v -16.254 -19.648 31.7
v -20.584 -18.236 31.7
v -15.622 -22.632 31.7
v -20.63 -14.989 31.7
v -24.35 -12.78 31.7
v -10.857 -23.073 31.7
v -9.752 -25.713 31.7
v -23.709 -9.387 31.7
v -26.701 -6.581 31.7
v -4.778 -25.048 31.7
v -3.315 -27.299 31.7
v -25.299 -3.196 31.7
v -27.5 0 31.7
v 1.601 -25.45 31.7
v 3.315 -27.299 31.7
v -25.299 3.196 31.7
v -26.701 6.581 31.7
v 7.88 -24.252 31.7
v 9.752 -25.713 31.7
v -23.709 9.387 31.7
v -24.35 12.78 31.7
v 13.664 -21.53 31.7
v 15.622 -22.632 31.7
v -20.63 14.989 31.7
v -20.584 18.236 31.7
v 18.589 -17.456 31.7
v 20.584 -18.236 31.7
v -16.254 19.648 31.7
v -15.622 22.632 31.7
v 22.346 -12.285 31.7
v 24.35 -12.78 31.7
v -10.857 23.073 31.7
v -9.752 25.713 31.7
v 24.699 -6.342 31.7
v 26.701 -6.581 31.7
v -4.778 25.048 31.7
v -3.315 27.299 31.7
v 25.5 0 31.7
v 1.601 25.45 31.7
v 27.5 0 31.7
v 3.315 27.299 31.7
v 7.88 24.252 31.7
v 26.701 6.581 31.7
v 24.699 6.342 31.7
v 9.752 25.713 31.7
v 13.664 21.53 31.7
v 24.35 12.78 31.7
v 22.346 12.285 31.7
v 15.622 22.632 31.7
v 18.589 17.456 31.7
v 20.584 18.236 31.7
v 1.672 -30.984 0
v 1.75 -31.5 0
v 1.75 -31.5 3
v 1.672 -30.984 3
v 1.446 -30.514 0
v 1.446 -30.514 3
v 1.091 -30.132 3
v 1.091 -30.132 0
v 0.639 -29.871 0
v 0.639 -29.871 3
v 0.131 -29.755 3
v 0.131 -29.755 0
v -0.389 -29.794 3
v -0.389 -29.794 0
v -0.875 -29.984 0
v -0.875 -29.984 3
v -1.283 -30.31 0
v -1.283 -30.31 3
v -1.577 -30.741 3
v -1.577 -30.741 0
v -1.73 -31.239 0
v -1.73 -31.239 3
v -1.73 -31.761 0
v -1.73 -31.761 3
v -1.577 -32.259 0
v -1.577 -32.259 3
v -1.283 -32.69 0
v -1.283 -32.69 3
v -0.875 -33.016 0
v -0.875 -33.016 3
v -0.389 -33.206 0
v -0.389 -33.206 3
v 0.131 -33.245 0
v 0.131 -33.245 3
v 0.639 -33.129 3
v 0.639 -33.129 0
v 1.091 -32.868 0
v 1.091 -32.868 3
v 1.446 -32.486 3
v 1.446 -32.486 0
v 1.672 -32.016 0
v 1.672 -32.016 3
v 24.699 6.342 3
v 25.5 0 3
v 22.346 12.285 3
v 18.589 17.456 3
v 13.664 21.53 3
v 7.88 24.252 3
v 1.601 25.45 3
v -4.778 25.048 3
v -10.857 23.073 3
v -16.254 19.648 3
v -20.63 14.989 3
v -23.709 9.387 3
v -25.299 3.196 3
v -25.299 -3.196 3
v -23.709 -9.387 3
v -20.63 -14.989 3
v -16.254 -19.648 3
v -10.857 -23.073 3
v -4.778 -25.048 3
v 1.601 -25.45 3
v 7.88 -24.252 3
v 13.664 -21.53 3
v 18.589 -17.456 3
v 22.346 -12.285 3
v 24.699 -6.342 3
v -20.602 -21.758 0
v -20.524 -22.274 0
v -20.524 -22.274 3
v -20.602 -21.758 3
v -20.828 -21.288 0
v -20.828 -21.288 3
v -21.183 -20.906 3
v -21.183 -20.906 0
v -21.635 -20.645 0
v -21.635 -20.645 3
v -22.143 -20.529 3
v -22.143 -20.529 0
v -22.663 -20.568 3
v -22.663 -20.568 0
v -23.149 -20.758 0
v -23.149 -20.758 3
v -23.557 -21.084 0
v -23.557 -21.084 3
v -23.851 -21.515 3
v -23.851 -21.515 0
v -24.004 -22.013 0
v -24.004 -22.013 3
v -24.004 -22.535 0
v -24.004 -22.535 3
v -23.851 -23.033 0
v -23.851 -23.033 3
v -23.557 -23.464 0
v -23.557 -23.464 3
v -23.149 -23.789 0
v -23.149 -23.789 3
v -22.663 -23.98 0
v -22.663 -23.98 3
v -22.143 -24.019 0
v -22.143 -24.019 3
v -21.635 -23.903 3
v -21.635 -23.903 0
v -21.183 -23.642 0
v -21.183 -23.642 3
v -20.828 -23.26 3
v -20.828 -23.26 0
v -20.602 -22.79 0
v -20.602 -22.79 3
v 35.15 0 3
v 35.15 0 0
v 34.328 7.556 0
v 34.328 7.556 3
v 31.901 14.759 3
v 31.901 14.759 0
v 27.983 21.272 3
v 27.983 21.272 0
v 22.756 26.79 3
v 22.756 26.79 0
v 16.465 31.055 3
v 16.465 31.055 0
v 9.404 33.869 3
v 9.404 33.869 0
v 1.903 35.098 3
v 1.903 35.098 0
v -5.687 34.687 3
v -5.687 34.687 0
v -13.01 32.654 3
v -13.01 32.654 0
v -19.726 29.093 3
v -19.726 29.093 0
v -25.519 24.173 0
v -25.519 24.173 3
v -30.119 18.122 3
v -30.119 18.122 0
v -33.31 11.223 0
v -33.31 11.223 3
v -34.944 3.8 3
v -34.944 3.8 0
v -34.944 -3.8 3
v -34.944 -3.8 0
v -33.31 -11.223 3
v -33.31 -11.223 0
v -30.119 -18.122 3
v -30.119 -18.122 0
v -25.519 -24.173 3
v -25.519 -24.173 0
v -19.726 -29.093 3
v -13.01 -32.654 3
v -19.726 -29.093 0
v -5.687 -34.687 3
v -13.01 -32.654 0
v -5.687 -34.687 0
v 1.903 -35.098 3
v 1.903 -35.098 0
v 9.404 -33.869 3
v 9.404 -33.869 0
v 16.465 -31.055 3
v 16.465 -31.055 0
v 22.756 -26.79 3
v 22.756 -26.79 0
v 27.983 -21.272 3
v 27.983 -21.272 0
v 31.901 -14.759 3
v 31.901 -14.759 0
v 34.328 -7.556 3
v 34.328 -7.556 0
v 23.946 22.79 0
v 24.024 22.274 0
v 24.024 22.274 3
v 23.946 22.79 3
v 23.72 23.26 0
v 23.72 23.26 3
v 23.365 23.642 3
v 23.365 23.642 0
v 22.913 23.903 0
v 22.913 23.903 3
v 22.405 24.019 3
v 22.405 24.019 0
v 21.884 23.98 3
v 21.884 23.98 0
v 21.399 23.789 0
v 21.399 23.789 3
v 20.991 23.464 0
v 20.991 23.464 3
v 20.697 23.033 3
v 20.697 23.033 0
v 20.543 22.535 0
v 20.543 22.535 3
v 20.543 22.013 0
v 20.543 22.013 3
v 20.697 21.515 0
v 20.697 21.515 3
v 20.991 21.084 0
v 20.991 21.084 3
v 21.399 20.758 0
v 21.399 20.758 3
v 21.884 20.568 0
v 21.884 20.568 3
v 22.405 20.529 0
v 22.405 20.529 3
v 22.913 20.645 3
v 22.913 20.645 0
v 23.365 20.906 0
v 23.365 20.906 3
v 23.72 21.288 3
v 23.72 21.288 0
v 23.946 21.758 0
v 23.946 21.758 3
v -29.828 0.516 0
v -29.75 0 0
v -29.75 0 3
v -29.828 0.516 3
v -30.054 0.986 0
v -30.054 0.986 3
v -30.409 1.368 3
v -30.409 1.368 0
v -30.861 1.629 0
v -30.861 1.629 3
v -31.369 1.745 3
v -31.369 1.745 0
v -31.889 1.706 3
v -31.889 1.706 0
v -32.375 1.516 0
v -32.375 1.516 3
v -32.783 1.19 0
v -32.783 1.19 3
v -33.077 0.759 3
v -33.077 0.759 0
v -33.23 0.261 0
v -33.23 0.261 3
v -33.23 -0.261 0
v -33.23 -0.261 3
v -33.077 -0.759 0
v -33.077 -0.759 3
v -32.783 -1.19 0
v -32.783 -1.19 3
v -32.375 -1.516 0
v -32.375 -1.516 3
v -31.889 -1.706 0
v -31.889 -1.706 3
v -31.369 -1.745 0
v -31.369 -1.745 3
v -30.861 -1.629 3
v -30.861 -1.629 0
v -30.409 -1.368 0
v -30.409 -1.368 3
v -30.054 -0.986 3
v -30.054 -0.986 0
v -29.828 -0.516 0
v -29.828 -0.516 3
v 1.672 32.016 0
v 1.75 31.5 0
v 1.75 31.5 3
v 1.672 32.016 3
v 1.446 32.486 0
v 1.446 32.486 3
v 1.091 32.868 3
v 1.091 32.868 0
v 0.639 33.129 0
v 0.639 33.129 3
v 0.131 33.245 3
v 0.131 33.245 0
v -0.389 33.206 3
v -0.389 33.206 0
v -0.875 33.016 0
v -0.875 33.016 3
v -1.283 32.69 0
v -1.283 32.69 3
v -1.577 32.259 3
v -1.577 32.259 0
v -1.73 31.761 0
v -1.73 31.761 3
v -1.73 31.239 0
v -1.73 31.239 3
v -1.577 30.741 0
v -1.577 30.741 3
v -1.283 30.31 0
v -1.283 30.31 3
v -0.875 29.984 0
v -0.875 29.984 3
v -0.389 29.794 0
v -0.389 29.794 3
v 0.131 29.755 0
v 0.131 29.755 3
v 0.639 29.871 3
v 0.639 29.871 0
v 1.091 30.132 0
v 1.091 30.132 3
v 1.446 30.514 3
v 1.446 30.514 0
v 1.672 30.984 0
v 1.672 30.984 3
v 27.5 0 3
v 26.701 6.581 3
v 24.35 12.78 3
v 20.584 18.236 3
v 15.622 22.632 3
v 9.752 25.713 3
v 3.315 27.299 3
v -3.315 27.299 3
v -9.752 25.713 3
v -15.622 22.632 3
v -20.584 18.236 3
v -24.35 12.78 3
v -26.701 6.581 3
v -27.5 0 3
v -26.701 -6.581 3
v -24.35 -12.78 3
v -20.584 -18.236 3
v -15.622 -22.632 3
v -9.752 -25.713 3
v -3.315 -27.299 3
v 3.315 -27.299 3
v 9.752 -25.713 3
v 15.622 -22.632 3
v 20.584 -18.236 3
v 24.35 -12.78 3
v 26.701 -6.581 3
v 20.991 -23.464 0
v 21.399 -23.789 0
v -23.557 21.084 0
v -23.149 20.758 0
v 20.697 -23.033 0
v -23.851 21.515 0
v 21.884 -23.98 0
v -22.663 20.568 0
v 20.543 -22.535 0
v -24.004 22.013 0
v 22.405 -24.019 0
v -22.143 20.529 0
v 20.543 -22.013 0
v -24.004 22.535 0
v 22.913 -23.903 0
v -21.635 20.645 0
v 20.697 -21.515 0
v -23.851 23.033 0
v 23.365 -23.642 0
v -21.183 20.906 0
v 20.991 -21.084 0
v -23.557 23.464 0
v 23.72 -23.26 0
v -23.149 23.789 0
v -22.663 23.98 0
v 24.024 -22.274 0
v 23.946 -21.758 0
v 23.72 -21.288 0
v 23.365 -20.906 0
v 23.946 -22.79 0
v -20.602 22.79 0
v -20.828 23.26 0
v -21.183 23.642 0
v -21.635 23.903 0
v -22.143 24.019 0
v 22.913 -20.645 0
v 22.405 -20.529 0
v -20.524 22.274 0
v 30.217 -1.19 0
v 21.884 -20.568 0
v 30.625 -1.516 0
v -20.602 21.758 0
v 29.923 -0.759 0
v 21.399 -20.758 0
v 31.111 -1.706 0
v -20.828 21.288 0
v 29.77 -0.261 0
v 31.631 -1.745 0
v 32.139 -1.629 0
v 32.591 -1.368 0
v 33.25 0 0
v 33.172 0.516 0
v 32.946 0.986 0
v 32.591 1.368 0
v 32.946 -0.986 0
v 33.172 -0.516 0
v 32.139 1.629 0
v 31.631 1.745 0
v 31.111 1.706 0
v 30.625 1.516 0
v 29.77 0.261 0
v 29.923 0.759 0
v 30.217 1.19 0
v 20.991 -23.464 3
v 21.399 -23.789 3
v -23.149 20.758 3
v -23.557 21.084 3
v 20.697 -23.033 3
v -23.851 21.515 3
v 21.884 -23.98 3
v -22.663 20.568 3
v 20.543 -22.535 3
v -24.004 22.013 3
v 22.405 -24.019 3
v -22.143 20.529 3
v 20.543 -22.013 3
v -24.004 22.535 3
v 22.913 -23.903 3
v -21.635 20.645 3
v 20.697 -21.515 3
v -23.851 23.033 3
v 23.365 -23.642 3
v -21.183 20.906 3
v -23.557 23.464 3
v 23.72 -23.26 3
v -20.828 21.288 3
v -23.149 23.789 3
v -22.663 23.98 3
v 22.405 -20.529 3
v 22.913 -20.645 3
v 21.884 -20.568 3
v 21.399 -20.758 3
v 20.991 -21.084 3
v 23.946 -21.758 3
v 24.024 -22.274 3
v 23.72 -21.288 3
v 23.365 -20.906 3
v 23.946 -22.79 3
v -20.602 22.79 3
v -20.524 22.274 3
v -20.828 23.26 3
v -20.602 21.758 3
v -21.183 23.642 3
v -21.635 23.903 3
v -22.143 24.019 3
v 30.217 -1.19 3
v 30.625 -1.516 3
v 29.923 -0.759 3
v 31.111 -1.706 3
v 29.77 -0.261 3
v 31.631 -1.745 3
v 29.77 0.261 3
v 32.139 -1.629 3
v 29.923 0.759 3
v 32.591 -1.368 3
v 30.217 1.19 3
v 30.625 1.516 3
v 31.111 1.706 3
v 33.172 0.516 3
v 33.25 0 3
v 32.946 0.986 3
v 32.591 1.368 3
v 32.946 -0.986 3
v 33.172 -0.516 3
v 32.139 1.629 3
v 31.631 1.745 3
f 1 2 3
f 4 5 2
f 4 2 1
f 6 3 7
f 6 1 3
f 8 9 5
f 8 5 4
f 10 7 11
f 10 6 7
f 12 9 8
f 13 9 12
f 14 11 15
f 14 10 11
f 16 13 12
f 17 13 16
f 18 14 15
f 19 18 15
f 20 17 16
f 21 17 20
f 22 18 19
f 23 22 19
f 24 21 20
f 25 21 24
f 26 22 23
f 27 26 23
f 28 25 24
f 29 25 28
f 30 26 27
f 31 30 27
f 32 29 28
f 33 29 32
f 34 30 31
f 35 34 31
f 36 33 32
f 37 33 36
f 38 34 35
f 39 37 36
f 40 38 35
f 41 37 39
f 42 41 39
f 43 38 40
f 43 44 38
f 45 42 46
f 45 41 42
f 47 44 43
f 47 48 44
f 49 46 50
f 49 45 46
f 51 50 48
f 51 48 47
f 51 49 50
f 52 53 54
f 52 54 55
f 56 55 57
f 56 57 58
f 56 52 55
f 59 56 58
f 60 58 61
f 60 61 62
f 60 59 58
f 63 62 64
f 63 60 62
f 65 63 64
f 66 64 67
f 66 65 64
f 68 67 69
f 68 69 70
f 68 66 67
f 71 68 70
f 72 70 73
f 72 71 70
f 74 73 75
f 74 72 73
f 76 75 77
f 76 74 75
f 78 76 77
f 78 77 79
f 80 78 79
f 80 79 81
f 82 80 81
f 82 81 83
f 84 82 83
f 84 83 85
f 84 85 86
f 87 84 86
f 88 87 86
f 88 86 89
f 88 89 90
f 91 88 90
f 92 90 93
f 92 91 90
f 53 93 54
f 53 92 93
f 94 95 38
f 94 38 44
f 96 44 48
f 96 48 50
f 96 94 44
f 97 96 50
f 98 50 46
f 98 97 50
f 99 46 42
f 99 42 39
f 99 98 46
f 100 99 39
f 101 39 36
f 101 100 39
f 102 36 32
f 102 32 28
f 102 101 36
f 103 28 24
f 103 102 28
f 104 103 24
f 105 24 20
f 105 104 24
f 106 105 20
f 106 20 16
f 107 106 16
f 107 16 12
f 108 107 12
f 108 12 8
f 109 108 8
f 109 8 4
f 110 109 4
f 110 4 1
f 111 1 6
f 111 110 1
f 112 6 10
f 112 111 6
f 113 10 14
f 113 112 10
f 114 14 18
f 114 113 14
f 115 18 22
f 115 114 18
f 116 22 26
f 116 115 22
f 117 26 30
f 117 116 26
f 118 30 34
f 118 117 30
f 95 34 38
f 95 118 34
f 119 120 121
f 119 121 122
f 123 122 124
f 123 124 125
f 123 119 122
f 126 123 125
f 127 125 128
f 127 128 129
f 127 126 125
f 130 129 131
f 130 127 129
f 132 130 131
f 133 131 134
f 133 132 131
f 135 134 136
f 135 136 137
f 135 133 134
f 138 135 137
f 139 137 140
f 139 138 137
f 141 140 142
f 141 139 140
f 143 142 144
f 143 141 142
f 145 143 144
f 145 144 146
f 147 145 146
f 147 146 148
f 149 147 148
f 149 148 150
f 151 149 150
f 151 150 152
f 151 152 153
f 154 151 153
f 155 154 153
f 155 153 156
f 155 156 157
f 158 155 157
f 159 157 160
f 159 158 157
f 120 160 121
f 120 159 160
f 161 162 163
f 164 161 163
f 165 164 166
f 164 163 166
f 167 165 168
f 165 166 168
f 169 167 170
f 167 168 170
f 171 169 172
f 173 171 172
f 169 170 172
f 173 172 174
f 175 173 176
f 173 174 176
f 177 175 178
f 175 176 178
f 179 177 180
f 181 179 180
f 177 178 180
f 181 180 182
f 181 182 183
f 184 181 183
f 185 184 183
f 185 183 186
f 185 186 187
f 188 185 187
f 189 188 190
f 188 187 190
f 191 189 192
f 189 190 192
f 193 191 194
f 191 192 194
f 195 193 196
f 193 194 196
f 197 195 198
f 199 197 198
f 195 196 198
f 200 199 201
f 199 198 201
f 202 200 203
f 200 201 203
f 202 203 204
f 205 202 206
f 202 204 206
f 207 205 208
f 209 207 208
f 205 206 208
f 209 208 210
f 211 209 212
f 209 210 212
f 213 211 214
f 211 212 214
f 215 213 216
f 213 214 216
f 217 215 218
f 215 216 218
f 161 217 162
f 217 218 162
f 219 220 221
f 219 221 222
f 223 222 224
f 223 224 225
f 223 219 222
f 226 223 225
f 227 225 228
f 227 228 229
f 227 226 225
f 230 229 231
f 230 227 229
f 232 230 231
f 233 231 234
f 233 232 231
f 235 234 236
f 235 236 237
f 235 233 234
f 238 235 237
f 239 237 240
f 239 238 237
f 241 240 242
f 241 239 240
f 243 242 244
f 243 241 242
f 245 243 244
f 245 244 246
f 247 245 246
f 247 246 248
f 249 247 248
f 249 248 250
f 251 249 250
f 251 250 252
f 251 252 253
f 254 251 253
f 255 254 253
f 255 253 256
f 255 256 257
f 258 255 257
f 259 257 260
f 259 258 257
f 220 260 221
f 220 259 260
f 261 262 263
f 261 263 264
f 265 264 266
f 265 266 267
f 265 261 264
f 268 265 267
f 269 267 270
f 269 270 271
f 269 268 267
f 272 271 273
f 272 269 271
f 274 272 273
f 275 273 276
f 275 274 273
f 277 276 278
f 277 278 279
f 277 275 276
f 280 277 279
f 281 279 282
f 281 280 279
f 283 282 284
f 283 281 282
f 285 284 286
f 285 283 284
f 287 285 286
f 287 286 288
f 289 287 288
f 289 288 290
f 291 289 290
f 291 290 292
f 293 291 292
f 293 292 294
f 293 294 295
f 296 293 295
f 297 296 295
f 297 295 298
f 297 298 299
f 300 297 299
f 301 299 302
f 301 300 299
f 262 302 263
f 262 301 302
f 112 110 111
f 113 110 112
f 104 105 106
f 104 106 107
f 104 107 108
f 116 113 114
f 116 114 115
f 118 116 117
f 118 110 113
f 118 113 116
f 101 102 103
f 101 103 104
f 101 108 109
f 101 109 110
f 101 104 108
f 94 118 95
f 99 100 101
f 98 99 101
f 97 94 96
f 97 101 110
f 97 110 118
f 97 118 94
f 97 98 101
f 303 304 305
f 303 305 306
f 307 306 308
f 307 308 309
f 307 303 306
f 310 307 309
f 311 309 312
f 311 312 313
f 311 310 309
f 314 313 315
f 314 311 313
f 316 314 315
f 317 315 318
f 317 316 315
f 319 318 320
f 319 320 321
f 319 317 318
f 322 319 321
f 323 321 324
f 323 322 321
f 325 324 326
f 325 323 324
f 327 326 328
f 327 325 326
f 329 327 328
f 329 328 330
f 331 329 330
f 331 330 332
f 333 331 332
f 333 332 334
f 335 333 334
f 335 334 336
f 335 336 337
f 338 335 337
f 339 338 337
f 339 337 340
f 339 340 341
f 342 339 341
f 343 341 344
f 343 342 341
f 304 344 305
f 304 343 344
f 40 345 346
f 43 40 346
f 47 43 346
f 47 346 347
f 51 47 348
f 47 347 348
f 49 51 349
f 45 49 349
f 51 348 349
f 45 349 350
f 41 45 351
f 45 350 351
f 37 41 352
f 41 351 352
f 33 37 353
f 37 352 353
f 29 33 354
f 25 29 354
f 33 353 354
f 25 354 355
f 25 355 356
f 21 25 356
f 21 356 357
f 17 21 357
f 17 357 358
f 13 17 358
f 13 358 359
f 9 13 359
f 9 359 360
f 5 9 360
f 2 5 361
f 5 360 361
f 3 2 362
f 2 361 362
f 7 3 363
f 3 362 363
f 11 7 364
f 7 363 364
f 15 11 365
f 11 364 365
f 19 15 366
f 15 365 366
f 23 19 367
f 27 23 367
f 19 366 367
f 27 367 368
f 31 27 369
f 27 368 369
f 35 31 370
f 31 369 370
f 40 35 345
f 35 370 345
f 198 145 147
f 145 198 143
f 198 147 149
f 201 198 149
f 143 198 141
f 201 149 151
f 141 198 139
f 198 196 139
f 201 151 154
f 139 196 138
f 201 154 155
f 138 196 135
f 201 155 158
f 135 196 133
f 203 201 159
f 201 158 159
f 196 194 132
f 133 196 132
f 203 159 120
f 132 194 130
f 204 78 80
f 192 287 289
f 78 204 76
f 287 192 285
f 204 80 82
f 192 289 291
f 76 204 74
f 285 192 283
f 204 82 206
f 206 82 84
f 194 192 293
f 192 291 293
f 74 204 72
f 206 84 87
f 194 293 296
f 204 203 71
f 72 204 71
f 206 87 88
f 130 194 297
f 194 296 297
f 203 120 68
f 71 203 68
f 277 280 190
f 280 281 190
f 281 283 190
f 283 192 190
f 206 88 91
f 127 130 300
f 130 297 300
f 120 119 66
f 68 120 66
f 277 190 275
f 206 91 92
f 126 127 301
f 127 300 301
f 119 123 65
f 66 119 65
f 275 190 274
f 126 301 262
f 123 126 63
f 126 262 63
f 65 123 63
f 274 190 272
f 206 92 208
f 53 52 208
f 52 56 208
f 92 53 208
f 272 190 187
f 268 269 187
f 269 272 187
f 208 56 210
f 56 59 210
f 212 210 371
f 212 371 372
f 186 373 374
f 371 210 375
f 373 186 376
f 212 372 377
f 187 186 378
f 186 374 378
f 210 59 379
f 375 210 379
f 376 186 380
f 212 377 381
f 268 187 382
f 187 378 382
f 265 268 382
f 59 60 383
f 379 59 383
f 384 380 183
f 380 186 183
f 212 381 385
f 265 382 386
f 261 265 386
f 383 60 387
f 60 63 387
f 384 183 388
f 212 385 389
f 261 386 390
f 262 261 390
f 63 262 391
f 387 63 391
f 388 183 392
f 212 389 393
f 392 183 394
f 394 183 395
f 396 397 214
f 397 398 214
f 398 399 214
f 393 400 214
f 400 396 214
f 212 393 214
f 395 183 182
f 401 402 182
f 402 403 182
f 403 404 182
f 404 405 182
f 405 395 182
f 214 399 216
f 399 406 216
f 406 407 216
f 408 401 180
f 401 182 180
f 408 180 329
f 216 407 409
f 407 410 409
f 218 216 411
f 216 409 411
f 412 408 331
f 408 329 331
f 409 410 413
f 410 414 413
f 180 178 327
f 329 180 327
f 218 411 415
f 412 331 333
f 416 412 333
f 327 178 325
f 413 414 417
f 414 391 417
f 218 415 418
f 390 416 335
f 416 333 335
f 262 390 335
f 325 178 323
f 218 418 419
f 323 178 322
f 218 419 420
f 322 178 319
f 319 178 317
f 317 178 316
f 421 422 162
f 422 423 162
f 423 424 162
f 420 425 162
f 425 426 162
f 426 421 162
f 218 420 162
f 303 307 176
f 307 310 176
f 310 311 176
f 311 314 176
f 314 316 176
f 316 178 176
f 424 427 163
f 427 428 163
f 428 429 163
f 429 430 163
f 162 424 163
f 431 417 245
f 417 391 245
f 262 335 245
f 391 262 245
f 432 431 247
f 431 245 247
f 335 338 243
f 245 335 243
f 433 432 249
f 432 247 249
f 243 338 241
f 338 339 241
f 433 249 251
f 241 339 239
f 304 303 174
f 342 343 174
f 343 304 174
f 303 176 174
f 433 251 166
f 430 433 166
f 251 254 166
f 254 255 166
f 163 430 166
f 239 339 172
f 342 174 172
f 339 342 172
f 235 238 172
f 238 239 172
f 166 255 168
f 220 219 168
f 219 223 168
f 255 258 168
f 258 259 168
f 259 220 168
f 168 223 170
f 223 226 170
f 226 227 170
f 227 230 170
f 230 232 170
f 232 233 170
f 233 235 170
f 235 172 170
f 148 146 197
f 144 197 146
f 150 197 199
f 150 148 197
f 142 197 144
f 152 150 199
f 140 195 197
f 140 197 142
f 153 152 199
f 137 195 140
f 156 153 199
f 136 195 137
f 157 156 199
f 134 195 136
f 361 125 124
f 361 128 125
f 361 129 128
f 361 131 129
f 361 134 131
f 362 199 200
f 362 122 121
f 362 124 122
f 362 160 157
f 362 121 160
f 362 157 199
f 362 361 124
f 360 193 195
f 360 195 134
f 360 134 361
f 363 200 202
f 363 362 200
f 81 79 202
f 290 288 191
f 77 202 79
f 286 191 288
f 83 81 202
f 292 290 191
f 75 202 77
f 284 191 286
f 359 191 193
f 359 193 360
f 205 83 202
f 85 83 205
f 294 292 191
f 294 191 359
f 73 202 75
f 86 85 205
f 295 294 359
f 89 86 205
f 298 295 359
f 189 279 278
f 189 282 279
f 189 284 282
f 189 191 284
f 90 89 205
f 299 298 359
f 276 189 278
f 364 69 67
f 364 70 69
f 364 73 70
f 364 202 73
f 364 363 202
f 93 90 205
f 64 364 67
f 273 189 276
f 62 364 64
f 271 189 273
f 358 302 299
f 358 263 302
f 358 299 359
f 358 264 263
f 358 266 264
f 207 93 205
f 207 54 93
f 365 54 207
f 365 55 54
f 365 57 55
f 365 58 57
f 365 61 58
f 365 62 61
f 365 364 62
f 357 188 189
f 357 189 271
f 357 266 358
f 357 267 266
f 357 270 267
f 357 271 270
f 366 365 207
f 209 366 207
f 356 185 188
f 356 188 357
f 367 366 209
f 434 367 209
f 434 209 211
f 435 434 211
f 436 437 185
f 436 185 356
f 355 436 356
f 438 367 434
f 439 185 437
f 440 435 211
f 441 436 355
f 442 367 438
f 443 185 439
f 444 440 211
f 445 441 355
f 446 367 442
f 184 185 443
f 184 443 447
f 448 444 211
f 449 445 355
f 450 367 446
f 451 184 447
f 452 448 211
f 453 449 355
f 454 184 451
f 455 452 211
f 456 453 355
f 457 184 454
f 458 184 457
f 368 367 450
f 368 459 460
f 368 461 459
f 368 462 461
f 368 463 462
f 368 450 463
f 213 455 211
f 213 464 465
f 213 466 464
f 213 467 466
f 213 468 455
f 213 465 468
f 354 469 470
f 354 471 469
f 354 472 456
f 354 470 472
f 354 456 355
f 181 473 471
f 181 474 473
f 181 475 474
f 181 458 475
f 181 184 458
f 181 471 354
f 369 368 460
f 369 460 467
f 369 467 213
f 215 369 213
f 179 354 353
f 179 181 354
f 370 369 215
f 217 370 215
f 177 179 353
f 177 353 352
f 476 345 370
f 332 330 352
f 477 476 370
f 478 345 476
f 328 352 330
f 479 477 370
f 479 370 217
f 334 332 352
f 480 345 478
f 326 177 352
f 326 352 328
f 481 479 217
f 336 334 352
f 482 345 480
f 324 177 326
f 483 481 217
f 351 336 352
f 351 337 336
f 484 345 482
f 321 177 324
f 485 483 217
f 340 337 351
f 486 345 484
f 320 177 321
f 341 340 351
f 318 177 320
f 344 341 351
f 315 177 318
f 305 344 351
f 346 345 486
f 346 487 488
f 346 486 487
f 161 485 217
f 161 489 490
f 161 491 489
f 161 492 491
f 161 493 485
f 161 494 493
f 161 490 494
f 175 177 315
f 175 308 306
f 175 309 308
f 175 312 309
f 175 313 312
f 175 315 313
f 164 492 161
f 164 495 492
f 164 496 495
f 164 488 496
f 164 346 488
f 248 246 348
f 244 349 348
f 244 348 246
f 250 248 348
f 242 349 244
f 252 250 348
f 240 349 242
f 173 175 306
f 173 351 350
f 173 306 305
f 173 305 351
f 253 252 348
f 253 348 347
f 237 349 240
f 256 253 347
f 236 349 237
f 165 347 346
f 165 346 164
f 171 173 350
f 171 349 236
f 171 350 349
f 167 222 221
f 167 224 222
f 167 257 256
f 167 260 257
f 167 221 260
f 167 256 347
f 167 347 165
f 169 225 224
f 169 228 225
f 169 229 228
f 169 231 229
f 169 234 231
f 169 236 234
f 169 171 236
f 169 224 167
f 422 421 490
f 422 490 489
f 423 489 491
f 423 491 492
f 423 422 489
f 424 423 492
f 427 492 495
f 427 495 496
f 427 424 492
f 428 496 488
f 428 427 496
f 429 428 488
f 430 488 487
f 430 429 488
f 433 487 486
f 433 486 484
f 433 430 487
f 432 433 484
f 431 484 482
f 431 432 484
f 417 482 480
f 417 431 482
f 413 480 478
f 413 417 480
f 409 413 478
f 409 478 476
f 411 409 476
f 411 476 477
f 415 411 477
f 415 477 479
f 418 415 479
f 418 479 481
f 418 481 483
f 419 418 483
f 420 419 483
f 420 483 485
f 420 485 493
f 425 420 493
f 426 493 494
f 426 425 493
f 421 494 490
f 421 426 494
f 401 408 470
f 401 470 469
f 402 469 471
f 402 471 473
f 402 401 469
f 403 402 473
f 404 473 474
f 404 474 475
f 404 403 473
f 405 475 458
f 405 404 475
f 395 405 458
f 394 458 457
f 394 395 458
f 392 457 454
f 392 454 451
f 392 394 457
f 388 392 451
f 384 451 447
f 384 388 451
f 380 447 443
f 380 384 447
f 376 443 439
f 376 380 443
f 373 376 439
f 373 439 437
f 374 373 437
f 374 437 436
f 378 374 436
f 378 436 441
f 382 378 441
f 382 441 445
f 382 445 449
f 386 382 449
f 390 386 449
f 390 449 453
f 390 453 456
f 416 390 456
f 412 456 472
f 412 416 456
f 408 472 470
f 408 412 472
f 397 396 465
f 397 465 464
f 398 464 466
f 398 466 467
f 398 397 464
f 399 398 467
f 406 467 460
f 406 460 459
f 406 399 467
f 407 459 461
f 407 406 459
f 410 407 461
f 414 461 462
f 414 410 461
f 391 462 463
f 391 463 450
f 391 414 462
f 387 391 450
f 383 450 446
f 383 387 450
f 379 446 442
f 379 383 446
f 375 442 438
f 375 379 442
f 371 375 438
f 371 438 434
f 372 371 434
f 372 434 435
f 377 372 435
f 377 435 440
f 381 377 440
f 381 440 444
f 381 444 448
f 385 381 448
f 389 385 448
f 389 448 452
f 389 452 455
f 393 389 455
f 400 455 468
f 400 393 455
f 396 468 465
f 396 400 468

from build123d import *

# Parameters (mm, degrees)
SKETCH1_R           = 35.15
SKETCH1_R_2         = 1.75
BOSS_EXTRUDE2_DEPTH = 3
SKETCH3_R           = 27.5
SKETCH3_R_2         = 25.5
BOSS_EXTRUDE3_DEPTH = 28.7


with BuildPart() as part:
    # Sketch1 → Boss-Extrude2 (new body)
    with BuildSketch(Plane.XY):
        Circle(SKETCH1_R)
        with Locations((0, 31.5)):
            Circle(SKETCH1_R_2, mode=Mode.SUBTRACT)
        with Locations((22.273863607, 22.273863607)):
            Circle(SKETCH1_R_2, mode=Mode.SUBTRACT)
        with Locations((31.5, 0)):
            Circle(SKETCH1_R_2, mode=Mode.SUBTRACT)
        with Locations((22.273863607, -22.273863607)):
            Circle(SKETCH1_R_2, mode=Mode.SUBTRACT)
        with Locations((0, -31.5)):
            Circle(SKETCH1_R_2, mode=Mode.SUBTRACT)
        with Locations((-22.273863607, -22.273863607)):
            Circle(SKETCH1_R_2, mode=Mode.SUBTRACT)
        with Locations((-31.5, 0)):
            Circle(SKETCH1_R_2, mode=Mode.SUBTRACT)
        with Locations((-22.273863607, 22.273863607)):
            Circle(SKETCH1_R_2, mode=Mode.SUBTRACT)
    extrude(amount=BOSS_EXTRUDE2_DEPTH)

    # Sketch3 → Boss-Extrude3 (add)
    with BuildSketch(Plane.XY.offset(3)):
        Circle(SKETCH3_R)
        Circle(SKETCH3_R_2, mode=Mode.SUBTRACT)
    extrude(amount=BOSS_EXTRUDE3_DEPTH)


solid = part.part
